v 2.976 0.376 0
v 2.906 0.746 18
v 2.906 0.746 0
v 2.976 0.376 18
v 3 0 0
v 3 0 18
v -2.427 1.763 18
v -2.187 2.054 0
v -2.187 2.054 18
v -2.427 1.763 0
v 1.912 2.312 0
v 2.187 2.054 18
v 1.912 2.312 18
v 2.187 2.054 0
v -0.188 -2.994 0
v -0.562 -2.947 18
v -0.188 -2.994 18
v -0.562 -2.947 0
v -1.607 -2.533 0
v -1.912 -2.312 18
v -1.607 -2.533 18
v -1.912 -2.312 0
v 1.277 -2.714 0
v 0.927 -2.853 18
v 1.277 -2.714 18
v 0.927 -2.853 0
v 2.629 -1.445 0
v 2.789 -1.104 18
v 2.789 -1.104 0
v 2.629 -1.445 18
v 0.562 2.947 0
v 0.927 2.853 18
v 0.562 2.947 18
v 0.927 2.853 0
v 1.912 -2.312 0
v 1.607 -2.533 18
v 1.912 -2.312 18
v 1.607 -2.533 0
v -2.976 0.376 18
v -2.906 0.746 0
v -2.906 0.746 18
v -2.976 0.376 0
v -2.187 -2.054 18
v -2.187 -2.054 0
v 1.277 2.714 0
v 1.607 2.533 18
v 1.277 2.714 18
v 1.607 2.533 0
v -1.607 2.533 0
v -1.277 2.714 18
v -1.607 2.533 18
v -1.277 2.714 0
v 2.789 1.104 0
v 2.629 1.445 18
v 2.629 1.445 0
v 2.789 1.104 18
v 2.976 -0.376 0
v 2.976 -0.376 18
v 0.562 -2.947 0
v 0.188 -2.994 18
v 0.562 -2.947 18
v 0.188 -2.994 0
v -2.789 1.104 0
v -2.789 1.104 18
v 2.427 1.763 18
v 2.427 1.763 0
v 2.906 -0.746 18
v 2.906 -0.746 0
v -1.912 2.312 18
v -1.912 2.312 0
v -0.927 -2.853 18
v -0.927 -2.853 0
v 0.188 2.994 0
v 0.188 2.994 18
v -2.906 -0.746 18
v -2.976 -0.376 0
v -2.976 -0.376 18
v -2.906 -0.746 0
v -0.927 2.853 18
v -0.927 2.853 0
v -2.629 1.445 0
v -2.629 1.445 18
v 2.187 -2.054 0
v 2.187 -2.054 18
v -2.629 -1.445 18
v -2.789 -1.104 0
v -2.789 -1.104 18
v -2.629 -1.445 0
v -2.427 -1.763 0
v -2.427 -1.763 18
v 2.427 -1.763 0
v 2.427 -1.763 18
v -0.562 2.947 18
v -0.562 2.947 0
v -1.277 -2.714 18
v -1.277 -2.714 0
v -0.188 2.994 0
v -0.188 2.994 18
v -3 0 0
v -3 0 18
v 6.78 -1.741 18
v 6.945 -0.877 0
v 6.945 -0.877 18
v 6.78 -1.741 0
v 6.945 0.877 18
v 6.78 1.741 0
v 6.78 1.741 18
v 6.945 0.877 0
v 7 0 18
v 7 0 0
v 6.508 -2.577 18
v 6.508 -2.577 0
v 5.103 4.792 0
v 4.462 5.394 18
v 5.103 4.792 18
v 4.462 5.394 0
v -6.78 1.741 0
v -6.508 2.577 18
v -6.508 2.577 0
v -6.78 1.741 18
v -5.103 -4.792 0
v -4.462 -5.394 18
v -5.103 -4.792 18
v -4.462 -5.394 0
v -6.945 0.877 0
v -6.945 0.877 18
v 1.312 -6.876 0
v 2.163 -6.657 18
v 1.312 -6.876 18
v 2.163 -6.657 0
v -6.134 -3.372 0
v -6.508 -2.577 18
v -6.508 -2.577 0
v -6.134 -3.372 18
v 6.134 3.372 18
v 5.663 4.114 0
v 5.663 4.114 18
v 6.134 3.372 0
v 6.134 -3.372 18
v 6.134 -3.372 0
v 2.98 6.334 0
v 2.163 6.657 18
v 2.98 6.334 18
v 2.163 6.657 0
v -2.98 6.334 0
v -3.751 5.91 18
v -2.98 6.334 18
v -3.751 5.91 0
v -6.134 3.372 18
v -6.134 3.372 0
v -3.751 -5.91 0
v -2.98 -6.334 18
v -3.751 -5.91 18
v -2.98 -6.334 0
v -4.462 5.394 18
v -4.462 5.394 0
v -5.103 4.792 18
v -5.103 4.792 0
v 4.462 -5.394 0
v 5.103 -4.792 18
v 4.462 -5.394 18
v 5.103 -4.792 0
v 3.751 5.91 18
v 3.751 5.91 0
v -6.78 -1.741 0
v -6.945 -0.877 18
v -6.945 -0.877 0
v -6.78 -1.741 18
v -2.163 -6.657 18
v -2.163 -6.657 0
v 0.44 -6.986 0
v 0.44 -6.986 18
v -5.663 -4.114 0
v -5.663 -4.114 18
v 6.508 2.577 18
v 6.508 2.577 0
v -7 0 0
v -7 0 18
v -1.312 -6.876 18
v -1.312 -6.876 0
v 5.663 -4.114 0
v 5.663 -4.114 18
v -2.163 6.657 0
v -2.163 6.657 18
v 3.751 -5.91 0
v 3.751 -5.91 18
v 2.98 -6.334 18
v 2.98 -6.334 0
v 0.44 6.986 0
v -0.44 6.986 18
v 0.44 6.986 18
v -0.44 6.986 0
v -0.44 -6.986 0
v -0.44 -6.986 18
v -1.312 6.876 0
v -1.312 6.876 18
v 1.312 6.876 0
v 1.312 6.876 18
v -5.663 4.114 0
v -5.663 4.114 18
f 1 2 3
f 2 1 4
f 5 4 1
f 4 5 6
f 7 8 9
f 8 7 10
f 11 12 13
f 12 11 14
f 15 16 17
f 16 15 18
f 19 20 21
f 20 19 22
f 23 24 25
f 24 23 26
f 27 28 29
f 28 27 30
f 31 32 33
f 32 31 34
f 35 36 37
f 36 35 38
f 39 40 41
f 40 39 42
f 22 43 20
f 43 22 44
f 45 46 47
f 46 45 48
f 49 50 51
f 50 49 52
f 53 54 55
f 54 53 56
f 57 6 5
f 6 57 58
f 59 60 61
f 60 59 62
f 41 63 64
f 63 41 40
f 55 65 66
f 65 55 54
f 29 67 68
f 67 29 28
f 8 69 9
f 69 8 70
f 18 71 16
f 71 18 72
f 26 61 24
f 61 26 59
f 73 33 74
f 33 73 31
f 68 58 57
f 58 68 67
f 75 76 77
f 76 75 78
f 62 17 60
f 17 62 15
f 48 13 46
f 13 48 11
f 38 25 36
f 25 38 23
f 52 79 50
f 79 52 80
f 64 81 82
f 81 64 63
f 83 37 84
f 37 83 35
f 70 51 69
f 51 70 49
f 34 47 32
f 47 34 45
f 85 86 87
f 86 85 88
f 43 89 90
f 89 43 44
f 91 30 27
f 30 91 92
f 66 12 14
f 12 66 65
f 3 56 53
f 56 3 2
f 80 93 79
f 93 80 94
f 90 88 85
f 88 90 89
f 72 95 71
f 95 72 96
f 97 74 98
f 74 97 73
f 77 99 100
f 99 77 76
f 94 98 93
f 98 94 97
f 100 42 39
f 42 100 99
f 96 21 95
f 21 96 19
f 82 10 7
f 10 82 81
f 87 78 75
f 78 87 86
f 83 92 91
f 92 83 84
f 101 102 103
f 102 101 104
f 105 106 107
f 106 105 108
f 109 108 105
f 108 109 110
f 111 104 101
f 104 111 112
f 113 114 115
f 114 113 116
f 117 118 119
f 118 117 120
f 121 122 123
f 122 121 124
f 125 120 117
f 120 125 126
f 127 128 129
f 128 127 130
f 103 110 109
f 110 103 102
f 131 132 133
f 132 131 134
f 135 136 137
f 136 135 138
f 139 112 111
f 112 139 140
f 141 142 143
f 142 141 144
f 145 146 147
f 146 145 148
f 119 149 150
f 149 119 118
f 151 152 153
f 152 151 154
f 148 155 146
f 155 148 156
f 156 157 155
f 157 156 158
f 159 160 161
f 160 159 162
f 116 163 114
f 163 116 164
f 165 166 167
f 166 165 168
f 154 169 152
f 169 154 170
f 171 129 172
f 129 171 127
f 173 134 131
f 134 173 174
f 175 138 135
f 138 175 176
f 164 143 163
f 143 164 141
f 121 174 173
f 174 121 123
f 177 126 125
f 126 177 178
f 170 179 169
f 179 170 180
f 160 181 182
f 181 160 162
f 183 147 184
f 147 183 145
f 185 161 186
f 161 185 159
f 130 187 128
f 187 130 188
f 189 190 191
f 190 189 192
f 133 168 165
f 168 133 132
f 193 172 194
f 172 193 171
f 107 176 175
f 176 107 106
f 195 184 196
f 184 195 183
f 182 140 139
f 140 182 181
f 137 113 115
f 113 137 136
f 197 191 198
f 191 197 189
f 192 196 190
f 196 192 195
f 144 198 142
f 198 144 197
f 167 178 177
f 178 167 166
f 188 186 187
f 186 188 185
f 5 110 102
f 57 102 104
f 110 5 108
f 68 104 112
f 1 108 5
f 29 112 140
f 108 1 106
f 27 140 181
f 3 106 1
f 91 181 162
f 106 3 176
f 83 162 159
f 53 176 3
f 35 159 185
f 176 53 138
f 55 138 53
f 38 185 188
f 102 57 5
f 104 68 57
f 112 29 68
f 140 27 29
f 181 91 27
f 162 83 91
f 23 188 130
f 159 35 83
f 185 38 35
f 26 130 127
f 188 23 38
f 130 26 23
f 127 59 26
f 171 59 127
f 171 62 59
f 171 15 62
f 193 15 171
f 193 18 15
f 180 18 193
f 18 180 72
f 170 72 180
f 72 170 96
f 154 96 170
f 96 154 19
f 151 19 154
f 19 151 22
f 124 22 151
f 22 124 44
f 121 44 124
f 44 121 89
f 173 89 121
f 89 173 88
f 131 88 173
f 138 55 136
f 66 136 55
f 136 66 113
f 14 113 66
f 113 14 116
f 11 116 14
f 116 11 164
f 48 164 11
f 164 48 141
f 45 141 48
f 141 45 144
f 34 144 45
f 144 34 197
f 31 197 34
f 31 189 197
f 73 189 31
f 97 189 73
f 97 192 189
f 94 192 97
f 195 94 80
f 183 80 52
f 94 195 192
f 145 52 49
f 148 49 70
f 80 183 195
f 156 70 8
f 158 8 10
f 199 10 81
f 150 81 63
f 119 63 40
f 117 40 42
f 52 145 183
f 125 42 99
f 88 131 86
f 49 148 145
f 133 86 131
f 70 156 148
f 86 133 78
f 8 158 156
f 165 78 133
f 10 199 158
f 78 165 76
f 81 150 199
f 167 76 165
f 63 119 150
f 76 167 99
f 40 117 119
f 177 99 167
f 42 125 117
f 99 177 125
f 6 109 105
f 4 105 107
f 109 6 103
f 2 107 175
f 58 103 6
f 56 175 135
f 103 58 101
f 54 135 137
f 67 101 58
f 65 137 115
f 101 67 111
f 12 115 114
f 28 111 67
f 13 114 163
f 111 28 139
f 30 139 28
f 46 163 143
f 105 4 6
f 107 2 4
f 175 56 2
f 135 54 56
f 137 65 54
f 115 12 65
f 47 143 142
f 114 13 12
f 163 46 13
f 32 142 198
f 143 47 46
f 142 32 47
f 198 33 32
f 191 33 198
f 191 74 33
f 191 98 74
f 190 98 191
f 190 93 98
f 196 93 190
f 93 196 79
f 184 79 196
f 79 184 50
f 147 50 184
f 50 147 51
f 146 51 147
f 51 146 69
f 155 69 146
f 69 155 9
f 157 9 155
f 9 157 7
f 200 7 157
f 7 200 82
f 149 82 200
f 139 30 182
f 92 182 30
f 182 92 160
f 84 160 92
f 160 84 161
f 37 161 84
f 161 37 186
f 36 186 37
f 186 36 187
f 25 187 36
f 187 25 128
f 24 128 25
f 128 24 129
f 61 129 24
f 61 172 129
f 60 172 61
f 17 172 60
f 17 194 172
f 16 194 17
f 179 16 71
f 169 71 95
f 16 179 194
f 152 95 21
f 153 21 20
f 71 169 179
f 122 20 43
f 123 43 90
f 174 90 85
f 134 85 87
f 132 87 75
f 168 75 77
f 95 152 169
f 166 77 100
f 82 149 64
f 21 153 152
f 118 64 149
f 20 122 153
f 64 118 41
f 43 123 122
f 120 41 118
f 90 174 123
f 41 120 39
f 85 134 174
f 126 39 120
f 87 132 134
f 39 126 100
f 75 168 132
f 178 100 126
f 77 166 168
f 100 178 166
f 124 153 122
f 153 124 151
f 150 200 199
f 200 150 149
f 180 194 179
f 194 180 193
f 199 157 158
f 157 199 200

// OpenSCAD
$fn = 50;


difference() {
	union() {
		cylinder(h = 18, r = 7.0000000000);
	}
	union() {
		translate(v = [0.0000000000, 0.0000000000, -100.0000000000]) {
			cylinder(h = 200, r = 3.0000000000);
		}
		cylinder(h = 18, r = 1.5000000000);
		cylinder(h = 18, r = 1.5000000000);
		cylinder(h = 18, r = 1.5000000000);
	}
}
